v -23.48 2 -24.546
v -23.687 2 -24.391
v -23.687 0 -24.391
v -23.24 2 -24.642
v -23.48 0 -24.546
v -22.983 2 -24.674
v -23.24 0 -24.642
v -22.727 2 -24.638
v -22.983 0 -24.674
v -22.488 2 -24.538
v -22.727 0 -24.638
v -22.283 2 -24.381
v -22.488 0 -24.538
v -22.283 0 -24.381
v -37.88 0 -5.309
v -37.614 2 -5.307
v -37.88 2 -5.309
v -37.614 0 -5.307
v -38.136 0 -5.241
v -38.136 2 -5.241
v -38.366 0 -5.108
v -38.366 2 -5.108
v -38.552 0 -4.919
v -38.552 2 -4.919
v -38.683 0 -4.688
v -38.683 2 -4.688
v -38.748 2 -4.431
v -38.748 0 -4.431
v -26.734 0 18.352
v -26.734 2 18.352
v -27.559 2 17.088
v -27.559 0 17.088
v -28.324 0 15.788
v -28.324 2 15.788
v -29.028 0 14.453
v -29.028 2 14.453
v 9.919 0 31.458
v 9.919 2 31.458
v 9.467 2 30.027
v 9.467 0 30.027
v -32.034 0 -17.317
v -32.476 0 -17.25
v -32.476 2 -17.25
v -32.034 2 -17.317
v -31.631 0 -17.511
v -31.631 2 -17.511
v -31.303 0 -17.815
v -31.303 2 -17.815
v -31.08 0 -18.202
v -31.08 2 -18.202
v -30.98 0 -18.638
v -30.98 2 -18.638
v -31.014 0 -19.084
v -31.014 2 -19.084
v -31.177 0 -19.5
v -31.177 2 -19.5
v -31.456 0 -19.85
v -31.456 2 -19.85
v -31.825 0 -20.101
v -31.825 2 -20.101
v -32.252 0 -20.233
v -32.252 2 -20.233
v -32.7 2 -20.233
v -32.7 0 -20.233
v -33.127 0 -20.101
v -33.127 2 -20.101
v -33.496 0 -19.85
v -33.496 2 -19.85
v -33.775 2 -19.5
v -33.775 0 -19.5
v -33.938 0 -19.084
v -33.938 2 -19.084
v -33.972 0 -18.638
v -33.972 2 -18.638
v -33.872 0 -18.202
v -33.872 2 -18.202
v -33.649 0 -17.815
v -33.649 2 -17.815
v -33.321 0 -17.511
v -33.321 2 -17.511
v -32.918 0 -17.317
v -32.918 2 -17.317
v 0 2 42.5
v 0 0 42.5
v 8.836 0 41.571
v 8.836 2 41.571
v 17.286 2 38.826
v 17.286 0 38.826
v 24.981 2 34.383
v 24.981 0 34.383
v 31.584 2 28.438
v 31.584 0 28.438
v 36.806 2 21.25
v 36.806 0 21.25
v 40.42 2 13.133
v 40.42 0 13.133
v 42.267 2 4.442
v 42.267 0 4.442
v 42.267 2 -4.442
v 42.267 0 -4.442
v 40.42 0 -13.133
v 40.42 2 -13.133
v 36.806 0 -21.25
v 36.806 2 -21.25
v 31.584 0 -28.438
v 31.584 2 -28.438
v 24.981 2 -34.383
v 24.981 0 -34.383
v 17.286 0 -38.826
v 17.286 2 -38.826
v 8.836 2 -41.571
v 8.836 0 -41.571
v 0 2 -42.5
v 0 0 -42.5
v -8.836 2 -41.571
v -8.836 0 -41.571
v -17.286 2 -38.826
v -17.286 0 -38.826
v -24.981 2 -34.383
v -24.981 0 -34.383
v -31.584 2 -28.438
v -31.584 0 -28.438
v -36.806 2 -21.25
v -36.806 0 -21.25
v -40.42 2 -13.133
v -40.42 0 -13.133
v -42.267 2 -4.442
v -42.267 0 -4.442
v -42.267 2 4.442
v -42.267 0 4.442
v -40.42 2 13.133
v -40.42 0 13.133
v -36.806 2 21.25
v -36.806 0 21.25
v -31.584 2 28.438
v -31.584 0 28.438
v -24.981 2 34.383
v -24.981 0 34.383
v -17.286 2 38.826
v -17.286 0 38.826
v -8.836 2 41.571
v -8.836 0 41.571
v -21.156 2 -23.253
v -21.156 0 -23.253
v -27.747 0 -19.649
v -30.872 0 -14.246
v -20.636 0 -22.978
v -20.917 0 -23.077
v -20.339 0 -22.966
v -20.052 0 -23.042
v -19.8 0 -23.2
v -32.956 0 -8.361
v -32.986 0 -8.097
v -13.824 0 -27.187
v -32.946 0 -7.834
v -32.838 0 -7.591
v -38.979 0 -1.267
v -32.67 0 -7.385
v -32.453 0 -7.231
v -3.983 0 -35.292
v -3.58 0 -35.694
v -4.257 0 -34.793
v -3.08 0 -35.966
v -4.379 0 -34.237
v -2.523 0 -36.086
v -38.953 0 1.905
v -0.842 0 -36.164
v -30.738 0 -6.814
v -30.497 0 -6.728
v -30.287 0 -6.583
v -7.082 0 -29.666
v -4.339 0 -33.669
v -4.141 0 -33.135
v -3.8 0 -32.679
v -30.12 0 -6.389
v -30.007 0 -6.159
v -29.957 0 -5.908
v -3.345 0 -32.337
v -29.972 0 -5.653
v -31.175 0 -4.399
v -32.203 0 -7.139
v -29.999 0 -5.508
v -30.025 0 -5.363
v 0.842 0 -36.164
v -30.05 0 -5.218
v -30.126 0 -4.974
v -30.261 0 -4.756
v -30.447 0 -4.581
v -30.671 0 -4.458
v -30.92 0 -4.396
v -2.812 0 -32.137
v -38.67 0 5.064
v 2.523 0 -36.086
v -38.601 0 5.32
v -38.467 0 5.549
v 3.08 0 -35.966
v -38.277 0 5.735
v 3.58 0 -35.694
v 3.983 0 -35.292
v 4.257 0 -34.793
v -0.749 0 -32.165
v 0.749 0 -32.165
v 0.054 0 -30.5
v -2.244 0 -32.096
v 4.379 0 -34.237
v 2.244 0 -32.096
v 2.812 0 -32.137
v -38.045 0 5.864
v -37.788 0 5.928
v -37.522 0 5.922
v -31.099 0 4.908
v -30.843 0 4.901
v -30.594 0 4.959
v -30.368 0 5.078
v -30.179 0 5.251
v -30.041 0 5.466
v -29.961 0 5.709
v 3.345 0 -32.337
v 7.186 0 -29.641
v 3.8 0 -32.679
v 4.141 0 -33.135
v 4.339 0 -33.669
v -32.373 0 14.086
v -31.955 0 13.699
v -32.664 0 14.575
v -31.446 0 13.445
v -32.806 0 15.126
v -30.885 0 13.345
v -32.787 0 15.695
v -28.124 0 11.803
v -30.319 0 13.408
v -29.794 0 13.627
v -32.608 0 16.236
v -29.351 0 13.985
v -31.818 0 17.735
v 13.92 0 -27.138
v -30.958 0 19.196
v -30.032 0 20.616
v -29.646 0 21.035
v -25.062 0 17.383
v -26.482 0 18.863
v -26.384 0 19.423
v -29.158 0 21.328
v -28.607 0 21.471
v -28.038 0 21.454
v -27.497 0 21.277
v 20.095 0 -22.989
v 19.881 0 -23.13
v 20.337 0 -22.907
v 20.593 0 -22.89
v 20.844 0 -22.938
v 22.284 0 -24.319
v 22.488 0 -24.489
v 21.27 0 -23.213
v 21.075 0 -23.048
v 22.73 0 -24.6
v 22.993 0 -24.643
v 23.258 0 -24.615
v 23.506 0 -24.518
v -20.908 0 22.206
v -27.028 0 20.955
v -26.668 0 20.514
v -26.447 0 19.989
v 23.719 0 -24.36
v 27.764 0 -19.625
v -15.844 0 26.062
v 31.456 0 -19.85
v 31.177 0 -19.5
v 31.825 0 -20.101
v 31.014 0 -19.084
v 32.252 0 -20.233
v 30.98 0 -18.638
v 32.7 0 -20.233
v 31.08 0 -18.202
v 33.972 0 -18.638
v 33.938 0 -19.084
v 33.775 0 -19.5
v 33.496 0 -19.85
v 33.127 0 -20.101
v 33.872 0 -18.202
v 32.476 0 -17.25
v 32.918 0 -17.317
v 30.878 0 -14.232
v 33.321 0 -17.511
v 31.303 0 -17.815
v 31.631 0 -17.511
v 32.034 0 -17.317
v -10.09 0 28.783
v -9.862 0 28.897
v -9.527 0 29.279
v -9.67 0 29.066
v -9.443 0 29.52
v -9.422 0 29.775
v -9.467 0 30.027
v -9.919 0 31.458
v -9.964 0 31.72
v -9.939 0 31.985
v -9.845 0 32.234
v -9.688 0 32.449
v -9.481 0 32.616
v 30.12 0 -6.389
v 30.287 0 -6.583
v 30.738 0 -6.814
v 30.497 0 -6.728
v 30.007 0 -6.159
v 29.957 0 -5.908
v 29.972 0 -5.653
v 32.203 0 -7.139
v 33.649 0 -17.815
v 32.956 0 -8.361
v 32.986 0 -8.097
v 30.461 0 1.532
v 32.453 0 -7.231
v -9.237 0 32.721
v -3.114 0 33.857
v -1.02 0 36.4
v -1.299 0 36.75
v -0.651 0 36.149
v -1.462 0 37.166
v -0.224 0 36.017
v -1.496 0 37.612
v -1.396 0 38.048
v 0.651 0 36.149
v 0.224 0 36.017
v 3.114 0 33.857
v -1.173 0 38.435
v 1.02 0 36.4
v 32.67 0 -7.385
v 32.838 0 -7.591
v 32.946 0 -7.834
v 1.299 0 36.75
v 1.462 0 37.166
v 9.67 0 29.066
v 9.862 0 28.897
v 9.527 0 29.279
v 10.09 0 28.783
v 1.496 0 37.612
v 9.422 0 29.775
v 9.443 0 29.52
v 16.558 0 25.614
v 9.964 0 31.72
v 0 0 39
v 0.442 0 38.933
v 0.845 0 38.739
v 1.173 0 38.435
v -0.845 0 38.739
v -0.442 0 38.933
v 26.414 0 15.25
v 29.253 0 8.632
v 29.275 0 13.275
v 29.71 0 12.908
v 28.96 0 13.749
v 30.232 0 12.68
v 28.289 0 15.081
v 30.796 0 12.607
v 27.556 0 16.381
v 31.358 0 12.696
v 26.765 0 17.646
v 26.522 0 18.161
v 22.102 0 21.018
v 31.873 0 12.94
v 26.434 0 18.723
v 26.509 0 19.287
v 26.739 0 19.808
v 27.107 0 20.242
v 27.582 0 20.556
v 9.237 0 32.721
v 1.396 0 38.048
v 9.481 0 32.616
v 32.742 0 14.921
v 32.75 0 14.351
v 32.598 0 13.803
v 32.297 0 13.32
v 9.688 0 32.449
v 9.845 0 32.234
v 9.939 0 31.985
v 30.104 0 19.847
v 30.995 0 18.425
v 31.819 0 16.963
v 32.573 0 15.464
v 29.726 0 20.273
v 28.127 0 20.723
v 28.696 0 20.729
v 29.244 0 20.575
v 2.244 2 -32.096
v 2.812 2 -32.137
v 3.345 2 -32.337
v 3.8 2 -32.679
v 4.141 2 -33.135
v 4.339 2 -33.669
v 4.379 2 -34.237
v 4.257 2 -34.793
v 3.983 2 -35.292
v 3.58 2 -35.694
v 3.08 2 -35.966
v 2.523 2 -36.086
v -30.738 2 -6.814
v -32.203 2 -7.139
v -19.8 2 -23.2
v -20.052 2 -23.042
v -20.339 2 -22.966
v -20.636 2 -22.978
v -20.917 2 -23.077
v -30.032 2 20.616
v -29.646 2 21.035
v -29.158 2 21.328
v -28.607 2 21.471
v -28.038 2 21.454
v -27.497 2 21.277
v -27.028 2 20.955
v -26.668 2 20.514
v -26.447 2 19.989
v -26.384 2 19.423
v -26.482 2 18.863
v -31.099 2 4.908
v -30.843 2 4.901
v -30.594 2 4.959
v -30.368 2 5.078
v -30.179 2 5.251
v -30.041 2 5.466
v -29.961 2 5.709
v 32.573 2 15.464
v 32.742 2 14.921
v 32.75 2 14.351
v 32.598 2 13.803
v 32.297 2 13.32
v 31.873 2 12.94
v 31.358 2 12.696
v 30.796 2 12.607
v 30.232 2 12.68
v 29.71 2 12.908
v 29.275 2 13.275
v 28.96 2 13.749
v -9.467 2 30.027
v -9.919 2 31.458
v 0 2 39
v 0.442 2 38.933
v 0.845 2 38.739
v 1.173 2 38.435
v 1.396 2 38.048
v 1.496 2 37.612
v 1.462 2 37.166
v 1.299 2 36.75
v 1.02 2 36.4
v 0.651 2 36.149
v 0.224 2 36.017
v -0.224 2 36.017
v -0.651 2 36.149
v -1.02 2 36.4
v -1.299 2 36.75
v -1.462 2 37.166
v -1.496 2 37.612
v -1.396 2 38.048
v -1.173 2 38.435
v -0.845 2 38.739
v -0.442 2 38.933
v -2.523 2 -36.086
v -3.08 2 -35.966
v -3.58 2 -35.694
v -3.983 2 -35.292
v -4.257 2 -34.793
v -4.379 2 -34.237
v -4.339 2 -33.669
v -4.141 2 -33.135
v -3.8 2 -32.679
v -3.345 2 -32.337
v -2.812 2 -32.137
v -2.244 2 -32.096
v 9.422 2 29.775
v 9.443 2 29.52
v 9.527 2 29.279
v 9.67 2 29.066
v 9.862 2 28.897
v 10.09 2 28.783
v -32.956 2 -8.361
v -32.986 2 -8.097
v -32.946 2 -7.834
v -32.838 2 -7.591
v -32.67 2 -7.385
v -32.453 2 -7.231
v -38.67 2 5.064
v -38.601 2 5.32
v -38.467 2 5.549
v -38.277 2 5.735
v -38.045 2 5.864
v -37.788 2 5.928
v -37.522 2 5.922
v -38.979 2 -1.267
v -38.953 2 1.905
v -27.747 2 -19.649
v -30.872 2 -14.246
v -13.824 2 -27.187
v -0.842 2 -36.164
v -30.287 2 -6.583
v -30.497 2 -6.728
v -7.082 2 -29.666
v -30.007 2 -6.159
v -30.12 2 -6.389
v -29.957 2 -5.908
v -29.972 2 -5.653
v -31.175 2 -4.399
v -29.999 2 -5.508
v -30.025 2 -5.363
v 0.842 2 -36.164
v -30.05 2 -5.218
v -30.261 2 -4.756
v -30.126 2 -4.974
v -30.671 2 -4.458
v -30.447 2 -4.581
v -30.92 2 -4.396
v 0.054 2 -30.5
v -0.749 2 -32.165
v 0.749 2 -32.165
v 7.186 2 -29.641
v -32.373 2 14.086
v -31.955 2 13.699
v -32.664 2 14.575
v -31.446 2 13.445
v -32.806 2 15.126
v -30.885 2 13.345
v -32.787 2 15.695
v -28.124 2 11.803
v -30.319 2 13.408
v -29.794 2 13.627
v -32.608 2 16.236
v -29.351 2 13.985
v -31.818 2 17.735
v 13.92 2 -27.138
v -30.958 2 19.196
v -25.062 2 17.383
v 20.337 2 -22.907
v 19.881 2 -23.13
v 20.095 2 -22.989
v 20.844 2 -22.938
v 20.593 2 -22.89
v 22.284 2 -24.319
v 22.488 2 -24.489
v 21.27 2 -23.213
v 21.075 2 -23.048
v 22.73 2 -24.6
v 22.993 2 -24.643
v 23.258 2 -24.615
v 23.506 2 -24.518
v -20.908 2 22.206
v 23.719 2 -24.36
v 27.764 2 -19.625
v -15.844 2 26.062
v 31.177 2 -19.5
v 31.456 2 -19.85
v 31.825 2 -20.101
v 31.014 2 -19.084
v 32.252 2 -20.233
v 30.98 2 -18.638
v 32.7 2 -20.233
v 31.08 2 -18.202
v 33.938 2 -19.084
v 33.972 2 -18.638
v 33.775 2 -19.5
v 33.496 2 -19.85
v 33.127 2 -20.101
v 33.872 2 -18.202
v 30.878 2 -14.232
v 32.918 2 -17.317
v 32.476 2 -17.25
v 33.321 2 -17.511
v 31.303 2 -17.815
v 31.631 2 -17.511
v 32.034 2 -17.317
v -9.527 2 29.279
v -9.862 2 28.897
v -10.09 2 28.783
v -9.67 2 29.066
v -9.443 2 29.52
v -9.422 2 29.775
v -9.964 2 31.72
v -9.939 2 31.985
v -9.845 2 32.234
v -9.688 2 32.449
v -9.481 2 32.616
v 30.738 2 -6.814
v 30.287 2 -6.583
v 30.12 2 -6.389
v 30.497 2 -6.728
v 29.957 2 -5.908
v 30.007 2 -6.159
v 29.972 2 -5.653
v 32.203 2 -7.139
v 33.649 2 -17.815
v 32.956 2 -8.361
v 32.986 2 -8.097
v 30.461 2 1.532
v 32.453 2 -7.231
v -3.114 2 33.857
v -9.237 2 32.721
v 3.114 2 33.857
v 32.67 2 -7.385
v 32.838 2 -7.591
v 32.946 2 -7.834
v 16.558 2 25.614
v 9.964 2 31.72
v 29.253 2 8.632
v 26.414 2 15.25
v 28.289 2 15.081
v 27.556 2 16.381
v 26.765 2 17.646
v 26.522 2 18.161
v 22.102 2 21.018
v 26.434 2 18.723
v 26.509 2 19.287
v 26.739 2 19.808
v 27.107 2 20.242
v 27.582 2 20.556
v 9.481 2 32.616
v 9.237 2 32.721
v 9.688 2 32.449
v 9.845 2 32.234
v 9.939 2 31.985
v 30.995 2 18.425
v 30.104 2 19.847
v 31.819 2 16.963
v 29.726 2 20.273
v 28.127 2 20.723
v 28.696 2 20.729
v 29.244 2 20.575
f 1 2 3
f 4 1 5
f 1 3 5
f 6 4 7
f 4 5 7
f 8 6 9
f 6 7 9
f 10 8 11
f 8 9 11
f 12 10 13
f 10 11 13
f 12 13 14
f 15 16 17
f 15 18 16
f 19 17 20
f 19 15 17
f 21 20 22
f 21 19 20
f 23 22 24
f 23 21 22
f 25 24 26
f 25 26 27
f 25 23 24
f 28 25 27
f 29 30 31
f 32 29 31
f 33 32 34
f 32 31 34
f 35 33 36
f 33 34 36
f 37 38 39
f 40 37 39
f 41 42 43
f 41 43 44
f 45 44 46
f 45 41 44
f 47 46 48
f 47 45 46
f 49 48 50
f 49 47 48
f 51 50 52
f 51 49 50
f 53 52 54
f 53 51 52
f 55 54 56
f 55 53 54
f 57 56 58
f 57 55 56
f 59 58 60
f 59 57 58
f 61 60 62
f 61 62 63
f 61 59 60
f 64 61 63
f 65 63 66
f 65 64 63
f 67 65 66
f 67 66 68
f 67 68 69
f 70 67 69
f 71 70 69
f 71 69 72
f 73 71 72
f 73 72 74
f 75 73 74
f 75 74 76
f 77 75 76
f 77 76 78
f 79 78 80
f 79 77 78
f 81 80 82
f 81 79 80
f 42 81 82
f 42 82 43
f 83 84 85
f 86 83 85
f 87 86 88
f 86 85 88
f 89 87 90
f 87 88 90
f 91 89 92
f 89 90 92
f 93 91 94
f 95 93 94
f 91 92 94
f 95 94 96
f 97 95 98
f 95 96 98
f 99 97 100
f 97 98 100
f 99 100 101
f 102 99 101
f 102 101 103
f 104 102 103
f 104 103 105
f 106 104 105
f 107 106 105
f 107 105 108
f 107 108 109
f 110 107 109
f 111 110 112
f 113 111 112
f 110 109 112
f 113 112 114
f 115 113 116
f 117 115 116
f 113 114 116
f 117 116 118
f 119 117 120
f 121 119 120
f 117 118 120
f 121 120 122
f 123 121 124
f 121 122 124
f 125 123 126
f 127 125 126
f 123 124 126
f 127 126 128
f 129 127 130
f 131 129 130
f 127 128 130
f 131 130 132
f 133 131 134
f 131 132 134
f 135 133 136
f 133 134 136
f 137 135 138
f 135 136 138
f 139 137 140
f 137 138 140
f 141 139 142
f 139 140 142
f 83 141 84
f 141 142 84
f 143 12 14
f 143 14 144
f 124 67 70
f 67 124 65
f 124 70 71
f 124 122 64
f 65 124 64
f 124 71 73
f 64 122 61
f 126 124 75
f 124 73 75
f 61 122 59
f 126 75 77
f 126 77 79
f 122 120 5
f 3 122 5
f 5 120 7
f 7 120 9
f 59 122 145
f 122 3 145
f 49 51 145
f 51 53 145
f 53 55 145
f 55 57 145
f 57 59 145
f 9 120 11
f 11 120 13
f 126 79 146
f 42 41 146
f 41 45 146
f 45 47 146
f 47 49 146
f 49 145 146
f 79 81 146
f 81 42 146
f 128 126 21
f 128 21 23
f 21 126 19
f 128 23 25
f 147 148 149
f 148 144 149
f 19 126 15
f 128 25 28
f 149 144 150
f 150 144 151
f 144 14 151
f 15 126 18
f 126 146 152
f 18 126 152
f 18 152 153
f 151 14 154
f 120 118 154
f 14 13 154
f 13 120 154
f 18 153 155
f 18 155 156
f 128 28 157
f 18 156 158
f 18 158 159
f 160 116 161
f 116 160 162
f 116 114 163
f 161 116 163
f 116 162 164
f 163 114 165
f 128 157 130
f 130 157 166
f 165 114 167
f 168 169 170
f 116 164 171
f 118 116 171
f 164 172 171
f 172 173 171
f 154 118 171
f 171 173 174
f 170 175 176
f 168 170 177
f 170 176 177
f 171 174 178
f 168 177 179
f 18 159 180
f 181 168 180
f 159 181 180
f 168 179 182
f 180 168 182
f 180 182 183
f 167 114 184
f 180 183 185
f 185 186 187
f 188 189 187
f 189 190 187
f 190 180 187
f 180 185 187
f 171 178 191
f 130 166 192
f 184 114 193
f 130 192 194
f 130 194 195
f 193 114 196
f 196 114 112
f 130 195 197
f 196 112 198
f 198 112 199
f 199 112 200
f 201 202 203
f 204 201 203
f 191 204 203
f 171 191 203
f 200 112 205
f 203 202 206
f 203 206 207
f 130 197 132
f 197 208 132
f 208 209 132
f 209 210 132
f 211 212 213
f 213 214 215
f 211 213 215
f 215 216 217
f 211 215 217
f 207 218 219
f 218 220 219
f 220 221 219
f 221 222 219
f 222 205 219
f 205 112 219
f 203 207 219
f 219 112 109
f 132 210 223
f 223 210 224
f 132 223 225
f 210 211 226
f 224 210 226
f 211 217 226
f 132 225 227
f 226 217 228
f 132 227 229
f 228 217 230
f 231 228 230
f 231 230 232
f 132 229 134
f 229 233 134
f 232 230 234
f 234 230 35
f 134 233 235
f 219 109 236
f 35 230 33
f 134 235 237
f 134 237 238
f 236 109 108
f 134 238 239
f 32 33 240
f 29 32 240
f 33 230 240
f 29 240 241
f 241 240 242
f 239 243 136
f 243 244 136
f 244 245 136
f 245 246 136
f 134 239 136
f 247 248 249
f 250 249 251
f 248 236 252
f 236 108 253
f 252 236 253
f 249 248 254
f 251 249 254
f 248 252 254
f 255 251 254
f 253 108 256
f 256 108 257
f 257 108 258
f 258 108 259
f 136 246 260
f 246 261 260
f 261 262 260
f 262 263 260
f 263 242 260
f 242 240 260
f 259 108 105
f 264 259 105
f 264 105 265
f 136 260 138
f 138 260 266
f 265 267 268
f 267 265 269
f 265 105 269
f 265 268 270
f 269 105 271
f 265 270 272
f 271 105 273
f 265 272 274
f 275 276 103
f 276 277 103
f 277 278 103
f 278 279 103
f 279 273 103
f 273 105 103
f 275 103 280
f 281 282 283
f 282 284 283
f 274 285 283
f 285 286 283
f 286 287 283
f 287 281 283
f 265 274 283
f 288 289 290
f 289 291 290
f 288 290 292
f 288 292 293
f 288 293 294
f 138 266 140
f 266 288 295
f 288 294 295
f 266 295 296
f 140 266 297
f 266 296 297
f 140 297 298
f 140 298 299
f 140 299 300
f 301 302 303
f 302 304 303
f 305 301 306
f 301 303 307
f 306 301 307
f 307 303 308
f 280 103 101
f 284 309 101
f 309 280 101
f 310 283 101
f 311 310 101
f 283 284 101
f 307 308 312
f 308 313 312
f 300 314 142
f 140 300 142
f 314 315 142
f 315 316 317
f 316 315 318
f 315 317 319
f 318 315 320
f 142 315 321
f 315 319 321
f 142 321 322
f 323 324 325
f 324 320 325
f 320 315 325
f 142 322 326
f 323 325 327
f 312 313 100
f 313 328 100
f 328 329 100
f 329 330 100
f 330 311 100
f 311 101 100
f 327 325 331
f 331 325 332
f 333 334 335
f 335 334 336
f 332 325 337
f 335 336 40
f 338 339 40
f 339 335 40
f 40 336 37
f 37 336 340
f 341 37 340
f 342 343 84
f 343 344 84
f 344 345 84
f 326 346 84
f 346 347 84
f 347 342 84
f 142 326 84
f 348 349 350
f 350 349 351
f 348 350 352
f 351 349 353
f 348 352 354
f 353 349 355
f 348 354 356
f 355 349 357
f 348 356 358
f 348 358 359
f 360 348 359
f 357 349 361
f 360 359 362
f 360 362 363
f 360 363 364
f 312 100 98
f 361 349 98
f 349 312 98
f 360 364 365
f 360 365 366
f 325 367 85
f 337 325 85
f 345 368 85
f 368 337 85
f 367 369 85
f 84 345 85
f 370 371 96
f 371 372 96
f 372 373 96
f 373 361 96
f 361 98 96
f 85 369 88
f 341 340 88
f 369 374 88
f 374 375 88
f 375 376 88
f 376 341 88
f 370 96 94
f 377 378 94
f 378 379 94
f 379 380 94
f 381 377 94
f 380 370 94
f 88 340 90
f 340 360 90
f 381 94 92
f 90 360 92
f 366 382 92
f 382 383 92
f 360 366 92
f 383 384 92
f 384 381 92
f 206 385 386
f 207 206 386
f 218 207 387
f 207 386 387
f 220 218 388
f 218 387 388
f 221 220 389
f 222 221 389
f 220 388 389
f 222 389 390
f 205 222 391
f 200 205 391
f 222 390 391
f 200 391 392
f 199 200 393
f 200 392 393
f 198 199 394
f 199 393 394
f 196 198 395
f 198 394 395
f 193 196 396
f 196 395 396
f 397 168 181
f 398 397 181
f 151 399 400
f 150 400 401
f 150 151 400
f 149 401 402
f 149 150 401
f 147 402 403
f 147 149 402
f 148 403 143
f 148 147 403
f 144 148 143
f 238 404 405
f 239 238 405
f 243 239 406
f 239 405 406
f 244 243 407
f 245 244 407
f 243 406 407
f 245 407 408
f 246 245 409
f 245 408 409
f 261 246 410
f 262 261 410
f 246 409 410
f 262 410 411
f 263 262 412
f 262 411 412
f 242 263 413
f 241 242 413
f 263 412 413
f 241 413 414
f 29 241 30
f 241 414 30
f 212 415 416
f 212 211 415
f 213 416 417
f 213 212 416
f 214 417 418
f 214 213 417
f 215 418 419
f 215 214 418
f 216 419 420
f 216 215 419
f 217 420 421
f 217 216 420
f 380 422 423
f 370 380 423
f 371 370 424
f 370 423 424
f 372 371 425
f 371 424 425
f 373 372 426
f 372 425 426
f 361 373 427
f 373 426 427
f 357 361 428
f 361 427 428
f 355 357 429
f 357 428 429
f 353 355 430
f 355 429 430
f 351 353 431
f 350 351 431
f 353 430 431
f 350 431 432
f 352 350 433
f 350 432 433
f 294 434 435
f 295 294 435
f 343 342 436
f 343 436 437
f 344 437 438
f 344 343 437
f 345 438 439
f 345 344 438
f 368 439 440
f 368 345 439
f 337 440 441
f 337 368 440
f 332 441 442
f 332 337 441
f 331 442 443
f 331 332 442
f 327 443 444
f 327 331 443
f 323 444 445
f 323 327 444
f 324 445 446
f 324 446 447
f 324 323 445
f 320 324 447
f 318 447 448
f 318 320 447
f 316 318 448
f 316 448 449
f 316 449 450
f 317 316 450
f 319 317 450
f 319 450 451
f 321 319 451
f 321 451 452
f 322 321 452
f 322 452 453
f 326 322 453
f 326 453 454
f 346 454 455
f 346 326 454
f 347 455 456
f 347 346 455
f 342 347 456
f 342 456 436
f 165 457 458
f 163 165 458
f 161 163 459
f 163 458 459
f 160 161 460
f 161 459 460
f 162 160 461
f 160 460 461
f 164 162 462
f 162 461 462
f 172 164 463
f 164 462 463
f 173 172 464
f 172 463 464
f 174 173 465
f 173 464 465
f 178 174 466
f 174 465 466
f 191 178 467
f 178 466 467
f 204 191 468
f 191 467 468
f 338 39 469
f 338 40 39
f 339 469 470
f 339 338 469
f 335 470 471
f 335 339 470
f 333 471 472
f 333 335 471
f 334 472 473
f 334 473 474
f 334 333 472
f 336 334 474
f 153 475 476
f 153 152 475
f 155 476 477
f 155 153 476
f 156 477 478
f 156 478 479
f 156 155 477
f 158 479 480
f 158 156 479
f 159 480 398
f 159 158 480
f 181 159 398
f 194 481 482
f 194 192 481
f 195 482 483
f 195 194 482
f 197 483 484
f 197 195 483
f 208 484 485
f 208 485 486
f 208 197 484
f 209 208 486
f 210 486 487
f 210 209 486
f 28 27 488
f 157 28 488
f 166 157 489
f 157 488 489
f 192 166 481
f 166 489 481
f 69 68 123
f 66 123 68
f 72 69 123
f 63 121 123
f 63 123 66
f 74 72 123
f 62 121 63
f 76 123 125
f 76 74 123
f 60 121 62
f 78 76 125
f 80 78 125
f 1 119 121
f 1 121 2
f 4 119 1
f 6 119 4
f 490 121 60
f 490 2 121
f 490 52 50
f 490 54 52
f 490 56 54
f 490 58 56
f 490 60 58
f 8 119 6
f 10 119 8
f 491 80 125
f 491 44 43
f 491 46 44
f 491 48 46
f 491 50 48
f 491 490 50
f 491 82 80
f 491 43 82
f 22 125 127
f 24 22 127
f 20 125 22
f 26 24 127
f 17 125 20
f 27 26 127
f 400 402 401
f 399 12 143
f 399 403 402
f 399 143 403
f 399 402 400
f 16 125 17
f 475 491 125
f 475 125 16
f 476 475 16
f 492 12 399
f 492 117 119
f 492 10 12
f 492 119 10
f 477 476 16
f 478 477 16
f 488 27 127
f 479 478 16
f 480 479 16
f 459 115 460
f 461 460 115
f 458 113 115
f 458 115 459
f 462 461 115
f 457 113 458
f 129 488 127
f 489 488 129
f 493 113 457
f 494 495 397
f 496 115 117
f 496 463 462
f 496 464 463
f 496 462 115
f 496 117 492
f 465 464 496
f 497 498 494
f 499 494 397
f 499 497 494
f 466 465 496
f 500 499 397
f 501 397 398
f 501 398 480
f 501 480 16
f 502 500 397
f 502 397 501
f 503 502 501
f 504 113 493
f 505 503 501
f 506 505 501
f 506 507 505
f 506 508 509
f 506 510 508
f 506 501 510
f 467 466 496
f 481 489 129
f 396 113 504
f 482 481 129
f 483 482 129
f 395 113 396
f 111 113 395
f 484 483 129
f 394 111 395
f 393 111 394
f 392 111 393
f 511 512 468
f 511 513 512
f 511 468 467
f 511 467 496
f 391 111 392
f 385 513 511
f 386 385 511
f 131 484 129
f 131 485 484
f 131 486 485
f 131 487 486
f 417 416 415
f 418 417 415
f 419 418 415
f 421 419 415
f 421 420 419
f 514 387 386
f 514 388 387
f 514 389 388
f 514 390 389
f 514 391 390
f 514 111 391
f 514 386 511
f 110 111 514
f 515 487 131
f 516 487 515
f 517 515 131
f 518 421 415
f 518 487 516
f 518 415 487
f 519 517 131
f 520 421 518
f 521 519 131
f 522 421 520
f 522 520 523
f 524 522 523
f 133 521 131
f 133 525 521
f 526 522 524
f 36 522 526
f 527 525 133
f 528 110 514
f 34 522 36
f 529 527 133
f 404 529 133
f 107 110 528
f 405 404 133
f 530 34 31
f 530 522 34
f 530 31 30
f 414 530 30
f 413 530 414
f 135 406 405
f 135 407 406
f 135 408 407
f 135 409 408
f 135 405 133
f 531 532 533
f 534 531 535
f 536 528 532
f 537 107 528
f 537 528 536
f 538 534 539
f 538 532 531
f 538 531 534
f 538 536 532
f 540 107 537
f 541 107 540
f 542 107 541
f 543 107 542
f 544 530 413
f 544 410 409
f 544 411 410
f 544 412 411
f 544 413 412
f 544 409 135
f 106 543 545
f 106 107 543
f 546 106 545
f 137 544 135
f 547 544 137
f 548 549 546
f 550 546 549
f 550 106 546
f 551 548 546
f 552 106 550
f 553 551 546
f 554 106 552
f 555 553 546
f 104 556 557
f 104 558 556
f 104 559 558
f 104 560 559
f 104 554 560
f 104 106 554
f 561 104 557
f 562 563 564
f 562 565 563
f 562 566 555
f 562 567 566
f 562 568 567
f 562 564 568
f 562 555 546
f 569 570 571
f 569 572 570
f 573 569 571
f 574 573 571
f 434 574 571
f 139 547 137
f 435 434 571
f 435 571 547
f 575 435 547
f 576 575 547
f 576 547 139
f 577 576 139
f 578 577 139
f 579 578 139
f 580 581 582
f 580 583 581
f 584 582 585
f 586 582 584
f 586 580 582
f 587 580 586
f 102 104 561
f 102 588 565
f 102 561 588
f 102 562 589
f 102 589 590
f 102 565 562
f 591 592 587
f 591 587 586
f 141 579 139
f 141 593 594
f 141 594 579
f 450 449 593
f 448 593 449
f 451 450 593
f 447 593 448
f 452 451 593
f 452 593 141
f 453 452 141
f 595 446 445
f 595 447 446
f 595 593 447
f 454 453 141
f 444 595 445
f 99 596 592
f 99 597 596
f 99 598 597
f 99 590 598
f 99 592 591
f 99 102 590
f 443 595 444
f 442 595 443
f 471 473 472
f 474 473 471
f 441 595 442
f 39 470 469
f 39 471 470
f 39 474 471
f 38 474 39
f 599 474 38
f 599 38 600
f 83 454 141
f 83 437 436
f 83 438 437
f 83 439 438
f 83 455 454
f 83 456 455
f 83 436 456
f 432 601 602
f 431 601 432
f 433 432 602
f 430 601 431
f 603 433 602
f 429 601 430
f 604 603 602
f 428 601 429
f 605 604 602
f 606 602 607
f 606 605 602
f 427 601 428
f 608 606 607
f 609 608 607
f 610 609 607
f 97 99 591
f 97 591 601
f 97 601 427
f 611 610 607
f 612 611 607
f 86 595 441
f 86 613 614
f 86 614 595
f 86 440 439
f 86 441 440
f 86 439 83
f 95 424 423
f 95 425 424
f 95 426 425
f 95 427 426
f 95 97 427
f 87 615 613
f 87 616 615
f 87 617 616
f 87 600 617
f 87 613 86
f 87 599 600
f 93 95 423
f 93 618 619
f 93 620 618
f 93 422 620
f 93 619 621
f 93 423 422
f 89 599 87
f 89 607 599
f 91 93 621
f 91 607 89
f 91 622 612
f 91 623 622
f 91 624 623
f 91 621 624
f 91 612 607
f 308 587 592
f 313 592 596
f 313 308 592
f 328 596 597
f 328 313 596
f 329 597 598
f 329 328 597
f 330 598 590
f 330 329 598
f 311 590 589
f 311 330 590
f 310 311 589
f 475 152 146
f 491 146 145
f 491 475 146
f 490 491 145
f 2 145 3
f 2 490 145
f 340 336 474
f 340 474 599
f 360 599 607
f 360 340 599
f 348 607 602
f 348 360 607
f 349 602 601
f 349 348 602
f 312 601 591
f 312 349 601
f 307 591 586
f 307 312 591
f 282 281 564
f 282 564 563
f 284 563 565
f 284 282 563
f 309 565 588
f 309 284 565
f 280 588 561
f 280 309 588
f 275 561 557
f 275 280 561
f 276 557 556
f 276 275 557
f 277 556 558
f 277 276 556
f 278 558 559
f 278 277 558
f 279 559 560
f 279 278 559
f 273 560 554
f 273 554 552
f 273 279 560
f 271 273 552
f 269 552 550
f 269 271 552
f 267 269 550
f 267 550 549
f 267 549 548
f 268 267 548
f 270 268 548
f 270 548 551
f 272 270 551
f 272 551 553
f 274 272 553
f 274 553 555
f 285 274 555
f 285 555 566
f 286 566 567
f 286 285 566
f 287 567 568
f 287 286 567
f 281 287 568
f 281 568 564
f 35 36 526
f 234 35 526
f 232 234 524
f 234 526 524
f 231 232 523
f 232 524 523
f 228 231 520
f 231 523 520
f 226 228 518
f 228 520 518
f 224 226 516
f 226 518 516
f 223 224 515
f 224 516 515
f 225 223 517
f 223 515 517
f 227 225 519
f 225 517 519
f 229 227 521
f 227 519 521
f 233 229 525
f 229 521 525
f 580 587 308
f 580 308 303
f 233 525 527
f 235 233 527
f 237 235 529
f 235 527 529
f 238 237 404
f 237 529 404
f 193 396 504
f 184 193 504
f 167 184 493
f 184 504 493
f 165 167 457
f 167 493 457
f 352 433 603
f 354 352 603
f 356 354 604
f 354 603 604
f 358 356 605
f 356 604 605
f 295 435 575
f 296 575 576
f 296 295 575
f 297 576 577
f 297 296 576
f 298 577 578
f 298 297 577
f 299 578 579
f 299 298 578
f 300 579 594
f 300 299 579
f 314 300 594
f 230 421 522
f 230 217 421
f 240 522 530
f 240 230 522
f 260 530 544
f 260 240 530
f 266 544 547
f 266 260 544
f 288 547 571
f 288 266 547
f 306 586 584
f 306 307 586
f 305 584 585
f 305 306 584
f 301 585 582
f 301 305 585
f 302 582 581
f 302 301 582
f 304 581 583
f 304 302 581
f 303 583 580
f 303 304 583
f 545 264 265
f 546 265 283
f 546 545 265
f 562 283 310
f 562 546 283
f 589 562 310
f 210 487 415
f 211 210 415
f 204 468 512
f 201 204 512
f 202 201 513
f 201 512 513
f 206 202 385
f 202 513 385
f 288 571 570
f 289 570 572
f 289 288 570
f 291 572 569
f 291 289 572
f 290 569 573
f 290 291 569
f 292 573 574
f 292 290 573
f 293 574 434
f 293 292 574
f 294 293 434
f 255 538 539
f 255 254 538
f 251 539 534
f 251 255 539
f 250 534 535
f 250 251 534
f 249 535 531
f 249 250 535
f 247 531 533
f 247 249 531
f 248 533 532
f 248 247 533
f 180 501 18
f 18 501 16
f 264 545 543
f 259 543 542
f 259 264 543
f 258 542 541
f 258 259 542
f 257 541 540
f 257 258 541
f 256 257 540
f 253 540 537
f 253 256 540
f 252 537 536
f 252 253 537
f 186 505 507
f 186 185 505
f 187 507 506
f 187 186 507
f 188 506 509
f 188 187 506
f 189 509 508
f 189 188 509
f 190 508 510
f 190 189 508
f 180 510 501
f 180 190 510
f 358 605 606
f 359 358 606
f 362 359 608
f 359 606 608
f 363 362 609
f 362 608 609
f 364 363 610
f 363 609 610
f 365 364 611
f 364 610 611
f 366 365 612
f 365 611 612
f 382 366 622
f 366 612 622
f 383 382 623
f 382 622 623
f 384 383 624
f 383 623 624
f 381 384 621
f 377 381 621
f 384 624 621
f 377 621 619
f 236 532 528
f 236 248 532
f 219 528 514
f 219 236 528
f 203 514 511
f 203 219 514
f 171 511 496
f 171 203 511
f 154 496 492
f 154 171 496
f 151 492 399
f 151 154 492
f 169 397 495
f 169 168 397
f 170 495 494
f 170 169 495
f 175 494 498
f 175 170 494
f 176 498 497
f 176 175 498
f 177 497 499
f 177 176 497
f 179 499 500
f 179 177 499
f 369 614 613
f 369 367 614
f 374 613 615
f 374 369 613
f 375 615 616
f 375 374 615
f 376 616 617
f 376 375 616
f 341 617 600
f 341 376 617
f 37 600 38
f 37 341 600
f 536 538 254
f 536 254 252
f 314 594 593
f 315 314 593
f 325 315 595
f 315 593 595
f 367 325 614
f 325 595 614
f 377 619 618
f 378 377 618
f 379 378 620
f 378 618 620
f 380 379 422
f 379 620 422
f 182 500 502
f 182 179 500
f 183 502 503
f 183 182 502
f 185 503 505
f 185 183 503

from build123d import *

# Parameters (mm, degrees)
SKETCH1_R           = 42.5
SKETCH1_R_2         = 30.5
SKETCH1_R_3         = 1.5
BOSS_EXTRUDE1_DEPTH = 2
SKETCH2_R           = 1.5
CUT_EXTRUDE1_DEPTH  = 61.137342808
CUT_EXTRUDE2_DEPTH  = 61.137342808
CUT_EXTRUDE3_DEPTH  = 61.137342808
FILLET1_R           = 1


with BuildPart() as part:
    # Sketch1 → Boss-Extrude1 (new body)
    with BuildSketch(Plane(origin=(0, 0, 0), x_dir=(1, 0, 0), z_dir=(0, 1, 0))):
        with Locations(Location((0, 0, 0), (0, 0, 270))):
            Circle(SKETCH1_R)
        with Locations(Location((0, 0, 0), (0, 0, 270))):
            Circle(SKETCH1_R_2, mode=Mode.SUBTRACT)
        with Locations(Location((0, 34.1739971, 0), (0, 0, 270))):
            Circle(SKETCH1_R_3, mode=Mode.SUBTRACT)
        with Locations(Location((-29.672696408, -17.456745562, 0), (0, 0, 270))):
            Circle(SKETCH1_R_3, mode=Mode.SUBTRACT)
        with Locations(Location((29.672696408, -16.717251537, 0), (0, 0, 270))):
            Circle(SKETCH1_R_3, mode=Mode.SUBTRACT)
        with Locations(Location((-32.475952642, 18.75, 0), (0, 0, 270))):
            Circle(SKETCH1_R_3, mode=Mode.SUBTRACT)
        with Locations(Location((0, -37.5, 0), (0, 0, 270))):
            Circle(SKETCH1_R_3, mode=Mode.SUBTRACT)
        with Locations(Location((32.475952642, 18.75, 0), (0, 0, 270))):
            Circle(SKETCH1_R_3, mode=Mode.SUBTRACT)
    extrude(amount=BOSS_EXTRUDE1_DEPTH)

    # Sketch2 → Cut-Extrude1 (cut, through all)
    # profile 1 of 3: a face of its own
    with BuildSketch(Plane(origin=(0, 2, 0), x_dir=(1, 0, 0), z_dir=(0, 1, 0))):
        with BuildLine():
            ThreePointArc((2.523370479, 36.085879061), (0, 36.1739971), (-2.523370479, 36.085879061))
            ThreePointArc((-2.523370479, 36.085879061), (-4.378985632, 33.951238013), (-2.244344584, 32.09562286))
            ThreePointArc((-2.244344584, 32.09562286), (0, 32.1739971), (2.244344584, 32.09562286))
            ThreePointArc((2.244344584, 32.09562286), (4.378985632, 33.951238013), (2.523370479, 36.085879061))
        make_face()
        with Locations((0, 34.1739971)):
            Circle(SKETCH2_R, mode=Mode.SUBTRACT)
    # profile 2 of 3: a face of its own
    with BuildSketch(Plane(origin=(0, 2, 0), x_dir=(1, 0, 0), z_dir=(0, 1, 0))):
        with BuildLine():
            ThreePointArc((-32.608491766, -16.235777693), (-31.396508518, -18.470881554), (-30.031564637, -20.615997137))
            ThreePointArc((-30.031564637, -20.615997137), (-27.250781536, -21.132954915), (-26.733823758, -18.352171814))
            ThreePointArc((-26.733823758, -18.352171814), (-27.948884299, -16.442609571), (-29.027780684, -14.452940586))
            ThreePointArc((-29.027780684, -14.452940586), (-31.709554778, -13.554003599), (-32.608491766, -16.235777693))
        make_face()
        with Locations((-29.672696408, -17.456745562)):
            Circle(SKETCH2_R, mode=Mode.SUBTRACT)
    # profile 3 of 3: a face of its own
    with BuildSketch(Plane(origin=(0, 2, 0), x_dir=(1, 0, 0), z_dir=(0, 1, 0))):
        with BuildLine():
            ThreePointArc((30.104043518, -19.847248501), (31.41518565, -17.69894968), (32.573276155, -15.464423355))
            ThreePointArc((32.573276155, -15.464423355), (31.6243086, -12.799942059), (28.959827303, -13.748909615))
            ThreePointArc((28.959827303, -13.748909615), (27.930207167, -15.735553395), (26.764513869, -17.64553514))
            ThreePointArc((26.764513869, -17.64553514), (27.333422013, -20.416156645), (30.104043518, -19.847248501))
        make_face()
        with Locations((29.672696408, -16.717251537)):
            Circle(SKETCH2_R, mode=Mode.SUBTRACT)
    extrude(amount=-CUT_EXTRUDE1_DEPTH, mode=Mode.SUBTRACT)

    # Sketch3 → Cut-Extrude2 (cut, through all)
    with BuildSketch(Plane(origin=(0, 2, 0), x_dir=(1, 0, 0), z_dir=(0, 1, 0))):
        with BuildLine():
            Line((-29.777028217, 6.601408225), (-33.194064242, 7.358946874))
            ThreePointArc((-33.194064242, 7.358946874), (-29.444863729, 17), (-22.970067059, 25.067429452))
            Line((-22.970067059, 25.067429452), (-20.492564537, 22.58992693))
            ThreePointArc((-20.492564537, 22.58992693), (-26.37548429, 15.316129684), (-29.777028217, 6.601408225))
        make_face()
        with BuildLine():
            Line((20.605501332, 22.486958773), (22.970067059, 25.067429452))
            ThreePointArc((22.970067059, 25.067429452), (29.444863729, 17), (33.194064242, 7.358946874))
            Line((33.194064242, 7.358946874), (29.777028217, 6.601408225))
            ThreePointArc((29.777028217, 6.601408225), (26.413774815, 15.25), (20.605501332, 22.486958773))
        make_face()
        with BuildLine():
            Line((-9.171526885, -29.088366998), (-10.223997183, -32.426376325))
            ThreePointArc((-10.223997183, -32.426376325), (0, -34), (10.223997183, -32.426376325))
            Line((10.223997183, -32.426376325), (9.171526885, -29.088366998))
            ThreePointArc((9.171526885, -29.088366998), (0, -30.5), (-9.171526885, -29.088366998))
        make_face()
    extrude(amount=-CUT_EXTRUDE2_DEPTH, mode=Mode.SUBTRACT)

    # Sketch4 → Cut-Extrude3 (cut, through all)
    with BuildSketch(Plane(origin=(0, 2, 0), x_dir=(1, 0, 0), z_dir=(0, 1, 0))):
        with BuildLine():
            Line((-30.200854727, 4.261264341), (-38.617486372, 5.448829814))
            ThreePointArc((-38.617486372, 5.448829814), (-38.998694951, -0.319048797), (-38.523169542, -6.079918457))
            Line((-38.523169542, -6.079918457), (-30.127094129, -4.754808024))
            ThreePointArc((-30.127094129, -4.754808024), (-30.498979385, -0.249512521), (-30.200854727, 4.261264341))
        make_face()
    extrude(amount=-CUT_EXTRUDE3_DEPTH, mode=Mode.SUBTRACT)

    # Fillet1
    fillet1_edges = [part.edges().sort_by_distance(p)[0] for p in [
        (-20.492564537, 1, -22.58992693),
        (-29.777028217, 1, -6.601408225),
        (-33.194064242, 1, -7.358946874),
        (-22.970067059, 1, -25.067429452),
        (-9.171526885, 1, 29.088366998),
        (9.171526885, 1, 29.088366998),
        (10.223997183, 1, 32.426376325),
        (-10.223997183, 1, 32.426376325),
        (22.970067059, 1, -25.067429452),
        (33.194064242, 1, -7.358946874),
        (29.777028217, 1, -6.601408225),
        (20.605501332, 1, -22.486958773),
        (-30.200854727, 1, -4.261264341),
        (-30.127094129, 1, 4.754808024),
        (-38.523169542, 1, 6.079918457),
        (-38.617486372, 1, -5.448829814),
    ]]
    fillet(fillet1_edges, radius=FILLET1_R)


solid = part.part
